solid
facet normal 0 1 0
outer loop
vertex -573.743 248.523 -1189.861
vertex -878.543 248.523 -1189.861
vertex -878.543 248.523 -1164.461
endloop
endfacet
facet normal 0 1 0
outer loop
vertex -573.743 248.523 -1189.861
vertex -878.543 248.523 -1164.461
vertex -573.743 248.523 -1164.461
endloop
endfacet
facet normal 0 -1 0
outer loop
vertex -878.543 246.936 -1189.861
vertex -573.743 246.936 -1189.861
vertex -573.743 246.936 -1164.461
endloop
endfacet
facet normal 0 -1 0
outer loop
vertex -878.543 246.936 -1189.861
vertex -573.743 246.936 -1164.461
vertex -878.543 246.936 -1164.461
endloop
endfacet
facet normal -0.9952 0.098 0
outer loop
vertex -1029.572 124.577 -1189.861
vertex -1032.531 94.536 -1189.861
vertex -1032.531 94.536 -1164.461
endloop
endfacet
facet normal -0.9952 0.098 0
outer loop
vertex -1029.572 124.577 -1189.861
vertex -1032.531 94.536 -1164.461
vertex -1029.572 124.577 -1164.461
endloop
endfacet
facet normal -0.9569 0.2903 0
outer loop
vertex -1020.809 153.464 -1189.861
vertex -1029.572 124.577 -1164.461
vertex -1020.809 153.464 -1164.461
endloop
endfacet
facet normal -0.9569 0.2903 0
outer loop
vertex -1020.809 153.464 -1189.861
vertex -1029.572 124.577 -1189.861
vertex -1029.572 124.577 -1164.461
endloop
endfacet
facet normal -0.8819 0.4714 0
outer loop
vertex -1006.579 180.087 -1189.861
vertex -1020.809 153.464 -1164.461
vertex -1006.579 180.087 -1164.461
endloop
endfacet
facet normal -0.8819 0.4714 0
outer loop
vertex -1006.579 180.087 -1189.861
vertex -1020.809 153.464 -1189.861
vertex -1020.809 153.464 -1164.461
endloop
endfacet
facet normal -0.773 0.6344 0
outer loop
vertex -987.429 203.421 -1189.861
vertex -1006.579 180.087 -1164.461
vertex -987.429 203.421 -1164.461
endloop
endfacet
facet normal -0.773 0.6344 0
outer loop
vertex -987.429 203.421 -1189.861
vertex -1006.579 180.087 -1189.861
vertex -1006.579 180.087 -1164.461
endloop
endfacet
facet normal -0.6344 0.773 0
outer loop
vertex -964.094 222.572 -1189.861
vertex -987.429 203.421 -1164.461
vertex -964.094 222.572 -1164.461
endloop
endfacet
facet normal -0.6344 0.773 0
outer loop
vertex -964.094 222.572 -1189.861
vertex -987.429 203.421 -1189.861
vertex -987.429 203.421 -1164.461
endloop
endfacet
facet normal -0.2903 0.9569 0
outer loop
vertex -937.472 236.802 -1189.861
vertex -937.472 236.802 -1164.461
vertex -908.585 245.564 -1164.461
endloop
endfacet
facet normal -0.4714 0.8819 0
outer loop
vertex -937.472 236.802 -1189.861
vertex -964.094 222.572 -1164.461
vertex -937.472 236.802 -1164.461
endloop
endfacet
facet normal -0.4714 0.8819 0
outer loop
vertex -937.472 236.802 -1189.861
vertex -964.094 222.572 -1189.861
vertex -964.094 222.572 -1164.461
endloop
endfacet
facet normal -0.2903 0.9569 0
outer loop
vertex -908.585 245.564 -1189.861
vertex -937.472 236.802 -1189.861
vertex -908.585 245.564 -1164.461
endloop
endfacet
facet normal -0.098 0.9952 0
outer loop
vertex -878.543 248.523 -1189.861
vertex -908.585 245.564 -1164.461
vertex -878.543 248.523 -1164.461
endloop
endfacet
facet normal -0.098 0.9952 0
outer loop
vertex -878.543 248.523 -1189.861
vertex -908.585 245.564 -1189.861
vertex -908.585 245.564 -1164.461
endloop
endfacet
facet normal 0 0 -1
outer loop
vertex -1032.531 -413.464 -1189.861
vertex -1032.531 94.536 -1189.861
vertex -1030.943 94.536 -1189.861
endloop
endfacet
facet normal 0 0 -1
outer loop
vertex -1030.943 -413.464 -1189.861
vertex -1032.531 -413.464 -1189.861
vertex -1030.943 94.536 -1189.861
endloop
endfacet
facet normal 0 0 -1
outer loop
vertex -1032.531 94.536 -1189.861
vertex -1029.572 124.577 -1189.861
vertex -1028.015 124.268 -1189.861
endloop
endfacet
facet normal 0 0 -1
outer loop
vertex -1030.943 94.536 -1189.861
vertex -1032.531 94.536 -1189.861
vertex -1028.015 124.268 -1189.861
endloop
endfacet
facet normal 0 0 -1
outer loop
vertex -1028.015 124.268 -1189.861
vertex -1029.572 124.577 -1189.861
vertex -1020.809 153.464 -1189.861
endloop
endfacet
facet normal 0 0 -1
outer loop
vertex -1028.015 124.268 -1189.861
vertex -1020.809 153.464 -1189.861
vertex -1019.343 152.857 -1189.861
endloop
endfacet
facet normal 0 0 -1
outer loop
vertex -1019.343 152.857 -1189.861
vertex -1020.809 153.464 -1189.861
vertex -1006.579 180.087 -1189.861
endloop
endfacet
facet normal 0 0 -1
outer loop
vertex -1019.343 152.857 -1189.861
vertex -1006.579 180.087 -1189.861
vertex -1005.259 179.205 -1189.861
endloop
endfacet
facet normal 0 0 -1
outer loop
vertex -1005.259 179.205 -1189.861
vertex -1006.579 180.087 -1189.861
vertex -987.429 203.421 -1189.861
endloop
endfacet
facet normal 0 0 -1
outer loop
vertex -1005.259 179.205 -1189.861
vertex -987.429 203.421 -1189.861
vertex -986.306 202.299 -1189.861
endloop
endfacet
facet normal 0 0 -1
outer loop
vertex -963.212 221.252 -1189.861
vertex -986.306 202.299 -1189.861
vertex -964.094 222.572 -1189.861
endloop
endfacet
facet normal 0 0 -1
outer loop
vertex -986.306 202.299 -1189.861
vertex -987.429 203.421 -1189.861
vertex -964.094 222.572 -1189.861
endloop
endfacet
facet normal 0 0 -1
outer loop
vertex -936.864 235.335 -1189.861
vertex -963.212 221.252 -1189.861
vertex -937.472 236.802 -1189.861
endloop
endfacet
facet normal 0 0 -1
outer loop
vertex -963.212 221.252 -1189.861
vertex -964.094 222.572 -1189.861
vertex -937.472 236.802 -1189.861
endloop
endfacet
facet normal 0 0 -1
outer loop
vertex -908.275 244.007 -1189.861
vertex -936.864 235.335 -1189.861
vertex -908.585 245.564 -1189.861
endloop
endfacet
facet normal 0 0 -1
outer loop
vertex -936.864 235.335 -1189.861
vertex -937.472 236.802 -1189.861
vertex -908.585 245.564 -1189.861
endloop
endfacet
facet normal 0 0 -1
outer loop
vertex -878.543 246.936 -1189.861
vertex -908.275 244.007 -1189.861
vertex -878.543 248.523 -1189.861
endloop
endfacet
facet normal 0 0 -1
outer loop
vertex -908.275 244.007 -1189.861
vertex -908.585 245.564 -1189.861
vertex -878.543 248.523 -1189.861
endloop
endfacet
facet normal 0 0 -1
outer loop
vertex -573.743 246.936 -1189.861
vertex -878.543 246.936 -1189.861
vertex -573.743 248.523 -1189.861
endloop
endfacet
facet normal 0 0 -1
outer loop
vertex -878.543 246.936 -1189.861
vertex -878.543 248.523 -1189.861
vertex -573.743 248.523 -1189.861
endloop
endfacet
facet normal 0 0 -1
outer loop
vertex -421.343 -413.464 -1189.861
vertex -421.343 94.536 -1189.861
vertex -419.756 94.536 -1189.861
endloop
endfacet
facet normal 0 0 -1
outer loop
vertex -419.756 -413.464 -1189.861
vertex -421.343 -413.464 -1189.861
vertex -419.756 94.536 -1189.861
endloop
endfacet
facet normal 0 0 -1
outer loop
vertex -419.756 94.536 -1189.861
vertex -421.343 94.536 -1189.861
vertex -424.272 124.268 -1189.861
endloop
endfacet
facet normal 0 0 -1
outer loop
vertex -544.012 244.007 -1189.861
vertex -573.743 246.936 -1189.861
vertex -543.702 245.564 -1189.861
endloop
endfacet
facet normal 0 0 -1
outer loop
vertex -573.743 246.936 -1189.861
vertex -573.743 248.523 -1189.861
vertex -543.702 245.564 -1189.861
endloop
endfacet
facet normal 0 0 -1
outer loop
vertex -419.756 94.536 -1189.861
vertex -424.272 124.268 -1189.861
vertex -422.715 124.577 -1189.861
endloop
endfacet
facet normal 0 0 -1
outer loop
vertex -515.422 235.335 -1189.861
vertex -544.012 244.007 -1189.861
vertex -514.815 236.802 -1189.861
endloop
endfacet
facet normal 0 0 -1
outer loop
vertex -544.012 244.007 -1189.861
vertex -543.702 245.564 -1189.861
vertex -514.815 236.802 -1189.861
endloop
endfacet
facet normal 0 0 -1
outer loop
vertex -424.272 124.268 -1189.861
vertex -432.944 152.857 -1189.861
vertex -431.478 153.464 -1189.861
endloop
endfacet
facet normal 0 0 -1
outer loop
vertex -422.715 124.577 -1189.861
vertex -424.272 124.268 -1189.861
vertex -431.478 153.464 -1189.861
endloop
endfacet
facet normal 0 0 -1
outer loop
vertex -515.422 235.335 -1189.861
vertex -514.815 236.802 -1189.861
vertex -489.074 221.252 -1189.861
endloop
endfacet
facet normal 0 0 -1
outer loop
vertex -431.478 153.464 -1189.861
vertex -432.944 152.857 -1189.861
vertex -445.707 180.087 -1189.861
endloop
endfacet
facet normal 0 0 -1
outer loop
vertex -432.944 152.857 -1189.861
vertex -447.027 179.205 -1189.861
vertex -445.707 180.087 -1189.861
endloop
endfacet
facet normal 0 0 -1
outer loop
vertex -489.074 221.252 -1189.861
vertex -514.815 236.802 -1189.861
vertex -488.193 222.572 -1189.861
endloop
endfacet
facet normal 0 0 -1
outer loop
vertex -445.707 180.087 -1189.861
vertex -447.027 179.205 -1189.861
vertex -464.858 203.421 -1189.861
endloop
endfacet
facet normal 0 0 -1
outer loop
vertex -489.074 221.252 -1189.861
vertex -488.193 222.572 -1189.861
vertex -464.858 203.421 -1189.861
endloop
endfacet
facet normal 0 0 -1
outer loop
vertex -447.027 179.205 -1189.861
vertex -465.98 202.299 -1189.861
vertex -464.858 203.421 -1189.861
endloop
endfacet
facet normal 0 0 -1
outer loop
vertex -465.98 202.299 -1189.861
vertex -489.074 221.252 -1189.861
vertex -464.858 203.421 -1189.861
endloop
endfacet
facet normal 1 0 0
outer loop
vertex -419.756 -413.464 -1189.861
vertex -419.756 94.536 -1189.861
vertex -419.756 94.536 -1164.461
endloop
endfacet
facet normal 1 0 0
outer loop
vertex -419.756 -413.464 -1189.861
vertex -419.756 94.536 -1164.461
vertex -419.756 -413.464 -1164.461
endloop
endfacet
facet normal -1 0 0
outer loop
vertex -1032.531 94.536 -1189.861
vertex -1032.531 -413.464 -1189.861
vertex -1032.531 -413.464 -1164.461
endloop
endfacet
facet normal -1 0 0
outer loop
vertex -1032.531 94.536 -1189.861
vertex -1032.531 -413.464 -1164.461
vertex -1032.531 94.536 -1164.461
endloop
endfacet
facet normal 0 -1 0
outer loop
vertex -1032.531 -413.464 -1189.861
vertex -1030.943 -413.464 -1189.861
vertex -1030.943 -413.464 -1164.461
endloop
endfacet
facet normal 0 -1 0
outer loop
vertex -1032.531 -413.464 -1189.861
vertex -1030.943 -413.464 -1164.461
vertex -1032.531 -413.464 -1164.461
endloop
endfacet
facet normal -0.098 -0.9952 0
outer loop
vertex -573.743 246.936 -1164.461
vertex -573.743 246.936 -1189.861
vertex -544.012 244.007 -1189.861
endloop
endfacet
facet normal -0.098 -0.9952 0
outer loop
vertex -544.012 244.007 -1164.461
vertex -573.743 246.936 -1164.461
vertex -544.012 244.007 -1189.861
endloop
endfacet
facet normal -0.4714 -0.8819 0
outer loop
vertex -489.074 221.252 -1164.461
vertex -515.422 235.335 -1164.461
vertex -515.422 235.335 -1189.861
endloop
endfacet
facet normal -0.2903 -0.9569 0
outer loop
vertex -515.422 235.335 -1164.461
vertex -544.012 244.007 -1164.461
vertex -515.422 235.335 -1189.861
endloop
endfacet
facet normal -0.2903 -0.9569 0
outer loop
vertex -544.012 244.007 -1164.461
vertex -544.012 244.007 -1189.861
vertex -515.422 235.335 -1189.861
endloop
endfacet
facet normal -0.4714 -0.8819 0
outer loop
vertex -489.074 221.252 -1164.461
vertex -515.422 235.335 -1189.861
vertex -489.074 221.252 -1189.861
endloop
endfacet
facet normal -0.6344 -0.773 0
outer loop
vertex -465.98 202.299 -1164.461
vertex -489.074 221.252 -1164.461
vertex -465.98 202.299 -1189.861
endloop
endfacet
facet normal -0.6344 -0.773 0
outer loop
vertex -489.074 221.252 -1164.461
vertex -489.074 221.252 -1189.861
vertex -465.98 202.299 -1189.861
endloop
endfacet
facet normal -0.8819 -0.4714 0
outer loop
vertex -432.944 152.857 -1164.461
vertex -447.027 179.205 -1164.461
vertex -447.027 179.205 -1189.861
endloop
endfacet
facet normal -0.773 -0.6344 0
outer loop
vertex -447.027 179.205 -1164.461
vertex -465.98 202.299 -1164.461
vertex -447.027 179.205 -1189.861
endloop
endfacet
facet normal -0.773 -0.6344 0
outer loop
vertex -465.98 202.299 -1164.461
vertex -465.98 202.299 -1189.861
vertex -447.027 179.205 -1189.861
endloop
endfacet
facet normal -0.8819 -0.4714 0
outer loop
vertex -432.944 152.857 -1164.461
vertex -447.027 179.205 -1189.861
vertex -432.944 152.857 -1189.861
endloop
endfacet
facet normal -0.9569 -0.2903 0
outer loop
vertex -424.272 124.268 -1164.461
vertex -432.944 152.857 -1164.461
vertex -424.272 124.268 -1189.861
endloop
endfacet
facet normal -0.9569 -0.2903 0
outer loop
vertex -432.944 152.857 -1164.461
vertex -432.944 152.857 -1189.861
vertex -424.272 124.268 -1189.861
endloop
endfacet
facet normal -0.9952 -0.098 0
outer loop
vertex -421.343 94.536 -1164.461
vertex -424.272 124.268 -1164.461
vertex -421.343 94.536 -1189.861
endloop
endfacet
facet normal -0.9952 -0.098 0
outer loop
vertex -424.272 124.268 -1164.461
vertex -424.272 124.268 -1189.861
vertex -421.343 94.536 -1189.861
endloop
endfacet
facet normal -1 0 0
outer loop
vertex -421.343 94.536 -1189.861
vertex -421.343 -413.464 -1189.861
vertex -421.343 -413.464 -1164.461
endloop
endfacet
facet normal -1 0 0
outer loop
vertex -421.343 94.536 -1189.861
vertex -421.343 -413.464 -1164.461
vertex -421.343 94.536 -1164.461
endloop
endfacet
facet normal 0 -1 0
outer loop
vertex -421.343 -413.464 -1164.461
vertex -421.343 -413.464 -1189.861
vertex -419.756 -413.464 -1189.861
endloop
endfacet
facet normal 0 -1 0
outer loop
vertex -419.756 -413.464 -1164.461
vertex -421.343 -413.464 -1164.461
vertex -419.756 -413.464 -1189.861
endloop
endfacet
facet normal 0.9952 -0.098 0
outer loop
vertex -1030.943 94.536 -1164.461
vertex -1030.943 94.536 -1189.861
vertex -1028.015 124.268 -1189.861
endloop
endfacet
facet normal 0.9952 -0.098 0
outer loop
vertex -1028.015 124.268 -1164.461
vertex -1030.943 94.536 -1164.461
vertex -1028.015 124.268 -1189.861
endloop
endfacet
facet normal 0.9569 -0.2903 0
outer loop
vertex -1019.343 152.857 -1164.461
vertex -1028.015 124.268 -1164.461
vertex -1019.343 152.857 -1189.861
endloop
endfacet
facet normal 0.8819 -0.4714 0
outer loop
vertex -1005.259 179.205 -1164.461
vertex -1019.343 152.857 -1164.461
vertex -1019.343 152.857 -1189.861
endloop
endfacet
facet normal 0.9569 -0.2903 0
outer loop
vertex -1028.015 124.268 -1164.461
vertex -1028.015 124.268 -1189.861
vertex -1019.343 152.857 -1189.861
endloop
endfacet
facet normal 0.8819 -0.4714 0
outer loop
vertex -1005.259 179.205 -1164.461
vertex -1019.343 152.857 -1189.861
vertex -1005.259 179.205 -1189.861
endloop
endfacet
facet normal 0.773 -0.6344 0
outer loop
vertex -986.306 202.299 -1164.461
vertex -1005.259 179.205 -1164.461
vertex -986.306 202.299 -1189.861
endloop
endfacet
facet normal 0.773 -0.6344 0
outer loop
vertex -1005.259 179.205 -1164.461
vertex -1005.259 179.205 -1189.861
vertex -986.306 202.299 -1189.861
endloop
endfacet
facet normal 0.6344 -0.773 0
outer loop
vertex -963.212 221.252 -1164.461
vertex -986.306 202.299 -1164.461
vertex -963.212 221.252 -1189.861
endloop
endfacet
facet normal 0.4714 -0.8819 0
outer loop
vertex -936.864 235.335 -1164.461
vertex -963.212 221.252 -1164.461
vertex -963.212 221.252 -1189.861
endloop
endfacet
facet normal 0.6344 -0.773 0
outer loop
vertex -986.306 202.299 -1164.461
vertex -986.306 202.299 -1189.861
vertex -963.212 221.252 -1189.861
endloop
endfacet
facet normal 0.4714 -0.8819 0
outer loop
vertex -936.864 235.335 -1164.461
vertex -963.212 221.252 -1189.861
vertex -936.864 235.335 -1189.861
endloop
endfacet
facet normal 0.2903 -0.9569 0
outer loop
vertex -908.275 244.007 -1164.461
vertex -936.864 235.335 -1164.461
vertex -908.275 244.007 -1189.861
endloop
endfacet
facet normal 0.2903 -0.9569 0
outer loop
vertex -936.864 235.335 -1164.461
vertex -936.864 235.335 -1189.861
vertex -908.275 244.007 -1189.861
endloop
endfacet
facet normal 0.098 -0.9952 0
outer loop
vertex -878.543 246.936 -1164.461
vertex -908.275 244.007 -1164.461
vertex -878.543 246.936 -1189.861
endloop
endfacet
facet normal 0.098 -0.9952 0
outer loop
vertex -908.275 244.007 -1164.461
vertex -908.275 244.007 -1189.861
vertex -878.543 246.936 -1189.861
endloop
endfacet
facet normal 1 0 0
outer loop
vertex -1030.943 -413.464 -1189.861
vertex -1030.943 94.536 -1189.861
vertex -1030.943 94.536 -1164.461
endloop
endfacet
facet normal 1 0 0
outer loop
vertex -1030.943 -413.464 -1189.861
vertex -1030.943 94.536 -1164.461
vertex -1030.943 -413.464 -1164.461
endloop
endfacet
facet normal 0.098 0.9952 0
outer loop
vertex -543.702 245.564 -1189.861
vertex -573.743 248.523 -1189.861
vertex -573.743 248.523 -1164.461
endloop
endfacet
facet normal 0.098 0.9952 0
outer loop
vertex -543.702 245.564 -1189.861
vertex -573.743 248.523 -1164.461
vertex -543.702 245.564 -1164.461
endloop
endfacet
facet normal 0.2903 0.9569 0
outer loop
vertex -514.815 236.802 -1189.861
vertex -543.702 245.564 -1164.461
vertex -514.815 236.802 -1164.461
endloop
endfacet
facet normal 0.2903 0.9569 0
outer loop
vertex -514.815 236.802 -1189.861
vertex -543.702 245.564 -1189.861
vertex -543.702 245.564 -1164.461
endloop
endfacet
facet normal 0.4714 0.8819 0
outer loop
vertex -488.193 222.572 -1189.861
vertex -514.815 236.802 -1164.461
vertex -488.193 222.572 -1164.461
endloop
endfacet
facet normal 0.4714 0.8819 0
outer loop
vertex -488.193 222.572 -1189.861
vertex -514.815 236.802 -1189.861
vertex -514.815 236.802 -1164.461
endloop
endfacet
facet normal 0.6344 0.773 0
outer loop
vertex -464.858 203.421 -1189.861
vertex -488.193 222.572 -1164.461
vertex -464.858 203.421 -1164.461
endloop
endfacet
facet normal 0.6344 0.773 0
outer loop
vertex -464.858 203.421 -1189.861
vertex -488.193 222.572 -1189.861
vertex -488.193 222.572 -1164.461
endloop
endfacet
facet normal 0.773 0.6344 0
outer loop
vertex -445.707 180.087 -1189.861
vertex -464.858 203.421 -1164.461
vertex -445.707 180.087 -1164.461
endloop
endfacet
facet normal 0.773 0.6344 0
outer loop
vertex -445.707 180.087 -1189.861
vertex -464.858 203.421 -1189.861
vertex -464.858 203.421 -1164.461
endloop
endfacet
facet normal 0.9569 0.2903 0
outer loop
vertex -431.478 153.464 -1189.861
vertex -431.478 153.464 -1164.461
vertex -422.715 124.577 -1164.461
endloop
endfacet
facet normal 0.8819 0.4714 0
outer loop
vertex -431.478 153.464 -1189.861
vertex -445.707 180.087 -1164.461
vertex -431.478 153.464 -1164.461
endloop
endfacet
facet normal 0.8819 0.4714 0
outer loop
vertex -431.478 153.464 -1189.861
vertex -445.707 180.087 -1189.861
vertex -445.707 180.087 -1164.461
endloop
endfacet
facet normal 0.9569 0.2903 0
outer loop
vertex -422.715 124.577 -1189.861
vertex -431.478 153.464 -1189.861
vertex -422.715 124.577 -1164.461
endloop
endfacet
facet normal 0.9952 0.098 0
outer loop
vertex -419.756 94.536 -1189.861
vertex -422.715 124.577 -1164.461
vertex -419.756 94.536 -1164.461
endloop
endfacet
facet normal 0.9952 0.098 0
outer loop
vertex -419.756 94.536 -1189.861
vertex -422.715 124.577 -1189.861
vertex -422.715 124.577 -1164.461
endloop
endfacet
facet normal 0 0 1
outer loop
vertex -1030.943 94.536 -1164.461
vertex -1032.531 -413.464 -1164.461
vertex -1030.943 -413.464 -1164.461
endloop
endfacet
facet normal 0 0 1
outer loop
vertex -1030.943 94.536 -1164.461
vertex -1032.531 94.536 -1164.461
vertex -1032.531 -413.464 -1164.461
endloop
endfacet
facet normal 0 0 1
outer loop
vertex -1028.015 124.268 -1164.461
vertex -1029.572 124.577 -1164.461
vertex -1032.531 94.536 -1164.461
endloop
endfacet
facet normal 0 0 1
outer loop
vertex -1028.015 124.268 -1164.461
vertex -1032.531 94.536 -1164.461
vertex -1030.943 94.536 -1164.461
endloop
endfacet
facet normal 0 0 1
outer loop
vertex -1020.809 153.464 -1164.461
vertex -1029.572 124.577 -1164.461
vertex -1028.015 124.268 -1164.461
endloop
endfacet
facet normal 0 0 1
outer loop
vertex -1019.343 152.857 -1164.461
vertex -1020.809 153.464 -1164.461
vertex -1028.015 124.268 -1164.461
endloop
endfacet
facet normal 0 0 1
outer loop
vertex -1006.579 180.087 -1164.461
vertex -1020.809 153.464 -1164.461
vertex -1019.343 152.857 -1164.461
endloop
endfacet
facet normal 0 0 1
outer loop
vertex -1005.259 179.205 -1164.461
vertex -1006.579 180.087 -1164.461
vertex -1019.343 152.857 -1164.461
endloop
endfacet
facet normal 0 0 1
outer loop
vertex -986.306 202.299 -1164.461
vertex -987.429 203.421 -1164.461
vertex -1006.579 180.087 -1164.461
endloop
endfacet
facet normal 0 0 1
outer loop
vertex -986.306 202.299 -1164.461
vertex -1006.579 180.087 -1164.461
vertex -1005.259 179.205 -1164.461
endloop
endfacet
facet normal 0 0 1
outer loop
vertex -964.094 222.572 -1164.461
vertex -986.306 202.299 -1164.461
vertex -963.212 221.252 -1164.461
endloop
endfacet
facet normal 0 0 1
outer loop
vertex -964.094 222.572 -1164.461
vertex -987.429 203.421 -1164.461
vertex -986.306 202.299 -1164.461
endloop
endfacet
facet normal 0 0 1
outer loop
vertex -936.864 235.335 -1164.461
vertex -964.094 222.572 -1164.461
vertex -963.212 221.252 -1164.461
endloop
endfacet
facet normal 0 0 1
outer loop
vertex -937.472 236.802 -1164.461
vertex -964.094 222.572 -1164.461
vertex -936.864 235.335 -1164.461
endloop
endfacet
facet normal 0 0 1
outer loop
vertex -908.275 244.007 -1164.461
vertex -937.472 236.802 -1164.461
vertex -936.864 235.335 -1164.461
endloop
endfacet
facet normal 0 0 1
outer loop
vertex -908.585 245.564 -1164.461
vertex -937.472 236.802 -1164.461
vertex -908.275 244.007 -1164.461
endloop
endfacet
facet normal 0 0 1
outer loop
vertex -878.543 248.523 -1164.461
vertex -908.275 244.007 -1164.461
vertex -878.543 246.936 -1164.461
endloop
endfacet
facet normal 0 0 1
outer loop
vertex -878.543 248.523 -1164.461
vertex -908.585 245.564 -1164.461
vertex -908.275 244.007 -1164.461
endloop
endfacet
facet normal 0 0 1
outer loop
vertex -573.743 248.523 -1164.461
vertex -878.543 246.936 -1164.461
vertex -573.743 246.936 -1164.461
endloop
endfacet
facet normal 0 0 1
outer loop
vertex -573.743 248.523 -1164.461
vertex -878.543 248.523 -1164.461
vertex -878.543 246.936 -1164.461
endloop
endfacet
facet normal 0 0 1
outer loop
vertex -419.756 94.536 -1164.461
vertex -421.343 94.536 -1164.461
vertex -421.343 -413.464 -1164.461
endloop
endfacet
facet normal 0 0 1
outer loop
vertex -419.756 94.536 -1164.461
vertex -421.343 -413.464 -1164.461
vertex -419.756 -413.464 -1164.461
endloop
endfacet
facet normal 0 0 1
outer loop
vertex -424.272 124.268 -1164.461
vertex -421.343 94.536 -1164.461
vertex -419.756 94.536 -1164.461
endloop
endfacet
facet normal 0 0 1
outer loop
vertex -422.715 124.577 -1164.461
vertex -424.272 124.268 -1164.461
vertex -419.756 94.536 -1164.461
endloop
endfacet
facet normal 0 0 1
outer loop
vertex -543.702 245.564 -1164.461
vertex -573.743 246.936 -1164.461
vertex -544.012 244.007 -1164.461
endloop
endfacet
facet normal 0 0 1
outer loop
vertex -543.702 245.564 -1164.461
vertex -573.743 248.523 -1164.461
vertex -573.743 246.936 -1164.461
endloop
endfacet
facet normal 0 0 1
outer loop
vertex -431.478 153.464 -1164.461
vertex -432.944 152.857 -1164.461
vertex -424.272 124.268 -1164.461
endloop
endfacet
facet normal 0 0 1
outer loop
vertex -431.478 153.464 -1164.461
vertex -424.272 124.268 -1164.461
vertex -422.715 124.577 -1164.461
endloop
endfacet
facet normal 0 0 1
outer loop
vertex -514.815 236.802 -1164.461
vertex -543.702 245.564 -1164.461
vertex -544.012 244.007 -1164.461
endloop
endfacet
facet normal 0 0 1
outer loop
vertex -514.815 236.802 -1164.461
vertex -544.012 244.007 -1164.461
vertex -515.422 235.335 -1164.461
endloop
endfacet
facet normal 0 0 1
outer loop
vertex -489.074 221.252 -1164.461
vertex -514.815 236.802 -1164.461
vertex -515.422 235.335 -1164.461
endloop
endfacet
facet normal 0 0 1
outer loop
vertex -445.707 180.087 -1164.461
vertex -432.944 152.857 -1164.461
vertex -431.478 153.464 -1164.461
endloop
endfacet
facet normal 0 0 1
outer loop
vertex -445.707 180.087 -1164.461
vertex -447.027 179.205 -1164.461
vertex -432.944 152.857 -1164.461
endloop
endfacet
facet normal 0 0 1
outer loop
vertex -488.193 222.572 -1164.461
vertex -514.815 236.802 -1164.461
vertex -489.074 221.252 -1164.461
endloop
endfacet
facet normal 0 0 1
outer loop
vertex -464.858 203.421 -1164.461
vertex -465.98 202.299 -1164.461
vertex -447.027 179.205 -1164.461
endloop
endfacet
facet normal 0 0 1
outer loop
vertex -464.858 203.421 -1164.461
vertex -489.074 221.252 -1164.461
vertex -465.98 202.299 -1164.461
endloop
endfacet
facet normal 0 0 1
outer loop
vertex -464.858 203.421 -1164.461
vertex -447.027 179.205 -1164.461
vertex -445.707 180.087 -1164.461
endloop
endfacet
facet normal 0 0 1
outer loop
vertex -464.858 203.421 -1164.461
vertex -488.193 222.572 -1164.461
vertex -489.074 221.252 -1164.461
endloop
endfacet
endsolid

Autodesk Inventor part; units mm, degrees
ref_plane "YZ Plane" through (0, 0, 0) normal (1, 0, 0) x (0, 1, 0)
ref_plane "XZ Plane" through (0, 0, 0) normal (0, 1, 0) x (-1, 0, 0)
ref_plane "XY Plane" through (0, 0, 0) normal (0, 0, 1) x (1, 0, 0)
ref_plane "Work Plane1" through (-878.5434, 221.5358, -1189.8607) normal (0, 0, 1) x (1, 0, 0)
sketch "Sketch2" plane through (-878.5434, 221.5358, -1189.8607) normal (0, 0, 1) x (1, 0, 0)
  line L0 (431.8, -127) -> (431.8, -304.8)
  line L1 (431.8, -304.8) -> (431.8, -393.7)
  line L2 (431.8, -393.7) -> (431.8, -635)
  line L3 (431.8, -635) -> (-127, -635)
  line L4 (-127, -635) -> (-127, -304.8)
  line L5 (-127, -304.8) -> (-127, -127)
  line L6 (304.8, 0) -> (0, 0)
  arc A0 (0, 12.7) -> (-139.7, -127) centre (0, -127) ccw construction
  line L7 (0, 12.7) -> (0, 11.049)
  arc A1 (0, 11.049) -> (-138.049, -127) centre (0, -127) ccw construction
  line L8 (-138.049, -127) -> (-139.7, -127)
  arc A2 (0, -12.7) -> (-114.3, -127) centre (0, -127) ccw construction
  line L9 (-114.3, -127) -> (-115.951, -127)
  arc A3 (0, -11.049) -> (-115.951, -127) centre (0, -127) ccw construction
  line L10 (0, -11.049) -> (0, -12.7)
  arc A4 (444.5, -127) -> (304.8, 12.7) centre (304.8, -127) ccw construction
  line L11 (444.5, -127) -> (442.849, -127)
  arc A5 (442.849, -127) -> (304.8, 11.049) centre (304.8, -127) ccw construction
  line L12 (304.8, 11.049) -> (304.8, 12.7)
  arc A6 (419.1, -127) -> (304.8, -12.7) centre (304.8, -127) ccw construction
  line L13 (304.8, -12.7) -> (304.8, -11.049)
  arc A7 (420.751, -127) -> (304.8, -11.049) centre (304.8, -127) ccw construction
  line L14 (420.751, -127) -> (419.1, -127)
  line L15 (0, -127) -> (179.6051, -127) construction
  line L16 (0, -127) -> (-80.8223, -46.1777) construction
  line L17 (-81.9897, -45.0103) -> (-97.6154, -29.3846)
  line L18 (-98.7828, -28.2172) -> (-127, 0)
  arc A8 (0, 0) -> (-127, -127) centre (0, -127) ccw
  line L19 (152.4, 0) -> (152.4, -147.1377) construction
  arc A9 (431.8, -127) -> (304.8, 0) centre (304.8, -127) ccw
  line L20 (-152.4, -127) -> (-152.4, -304.8)
  line L21 (-152.4, -304.8) -> (-152.4, -635)
  line L22 (457.2, -635) -> (457.2, -393.7)
  line L23 (457.2, -393.7) -> (457.2, -304.8)
  line L24 (457.2, -304.8) -> (457.2, -127)
  arc A10 (457.2, -127) -> (304.8, 25.4) centre (304.8, -127) ccw
  line L25 (304.8, 25.4) -> (0, 25.4)
  arc A11 (0, 25.4) -> (-152.4, -127) centre (0, -127) ccw
  line L26 (-153.9875, -304.8) -> (-153.9875, -127)
  arc A12 (0, 26.9875) -> (-153.9875, -127) centre (0, -127) ccw
  line L27 (0, 26.9875) -> (304.8, 26.9875)
  arc A13 (458.7875, -127) -> (304.8, 26.9875) centre (304.8, -127) ccw
  line L28 (458.7875, -127) -> (458.7875, -304.8)
  line L29 (458.7875, -304.8) -> (458.7875, -393.7)
  line L30 (458.7875, -393.7) -> (458.7875, -635)
  line L31 (-153.9875, -635) -> (-153.9875, -304.8)
  line L32 (431.8, -635) -> (458.7875, -635)
  line L33 (-127, -635) -> (-153.9875, -635)
  point P0 (878.5434, -221.5358)
  point P1 (-89.8026, -37.1974)
  point P2 (-107.7631, -19.2369)
  point P3 (-108.8856, -18.1144)
  dimension "d1" = 25.4
  dimension "d2" = 1.5875
extrude "Extrusion2" add sketch "Sketch2" along normal blind 25.4 contours L22 L23 L24 A10 L25 A11 L18 A12 L27 A13 L28 L29 L30 L32 | L33 L31 L26 A12 L18 A11 L20 L21
properties part number "end body"
